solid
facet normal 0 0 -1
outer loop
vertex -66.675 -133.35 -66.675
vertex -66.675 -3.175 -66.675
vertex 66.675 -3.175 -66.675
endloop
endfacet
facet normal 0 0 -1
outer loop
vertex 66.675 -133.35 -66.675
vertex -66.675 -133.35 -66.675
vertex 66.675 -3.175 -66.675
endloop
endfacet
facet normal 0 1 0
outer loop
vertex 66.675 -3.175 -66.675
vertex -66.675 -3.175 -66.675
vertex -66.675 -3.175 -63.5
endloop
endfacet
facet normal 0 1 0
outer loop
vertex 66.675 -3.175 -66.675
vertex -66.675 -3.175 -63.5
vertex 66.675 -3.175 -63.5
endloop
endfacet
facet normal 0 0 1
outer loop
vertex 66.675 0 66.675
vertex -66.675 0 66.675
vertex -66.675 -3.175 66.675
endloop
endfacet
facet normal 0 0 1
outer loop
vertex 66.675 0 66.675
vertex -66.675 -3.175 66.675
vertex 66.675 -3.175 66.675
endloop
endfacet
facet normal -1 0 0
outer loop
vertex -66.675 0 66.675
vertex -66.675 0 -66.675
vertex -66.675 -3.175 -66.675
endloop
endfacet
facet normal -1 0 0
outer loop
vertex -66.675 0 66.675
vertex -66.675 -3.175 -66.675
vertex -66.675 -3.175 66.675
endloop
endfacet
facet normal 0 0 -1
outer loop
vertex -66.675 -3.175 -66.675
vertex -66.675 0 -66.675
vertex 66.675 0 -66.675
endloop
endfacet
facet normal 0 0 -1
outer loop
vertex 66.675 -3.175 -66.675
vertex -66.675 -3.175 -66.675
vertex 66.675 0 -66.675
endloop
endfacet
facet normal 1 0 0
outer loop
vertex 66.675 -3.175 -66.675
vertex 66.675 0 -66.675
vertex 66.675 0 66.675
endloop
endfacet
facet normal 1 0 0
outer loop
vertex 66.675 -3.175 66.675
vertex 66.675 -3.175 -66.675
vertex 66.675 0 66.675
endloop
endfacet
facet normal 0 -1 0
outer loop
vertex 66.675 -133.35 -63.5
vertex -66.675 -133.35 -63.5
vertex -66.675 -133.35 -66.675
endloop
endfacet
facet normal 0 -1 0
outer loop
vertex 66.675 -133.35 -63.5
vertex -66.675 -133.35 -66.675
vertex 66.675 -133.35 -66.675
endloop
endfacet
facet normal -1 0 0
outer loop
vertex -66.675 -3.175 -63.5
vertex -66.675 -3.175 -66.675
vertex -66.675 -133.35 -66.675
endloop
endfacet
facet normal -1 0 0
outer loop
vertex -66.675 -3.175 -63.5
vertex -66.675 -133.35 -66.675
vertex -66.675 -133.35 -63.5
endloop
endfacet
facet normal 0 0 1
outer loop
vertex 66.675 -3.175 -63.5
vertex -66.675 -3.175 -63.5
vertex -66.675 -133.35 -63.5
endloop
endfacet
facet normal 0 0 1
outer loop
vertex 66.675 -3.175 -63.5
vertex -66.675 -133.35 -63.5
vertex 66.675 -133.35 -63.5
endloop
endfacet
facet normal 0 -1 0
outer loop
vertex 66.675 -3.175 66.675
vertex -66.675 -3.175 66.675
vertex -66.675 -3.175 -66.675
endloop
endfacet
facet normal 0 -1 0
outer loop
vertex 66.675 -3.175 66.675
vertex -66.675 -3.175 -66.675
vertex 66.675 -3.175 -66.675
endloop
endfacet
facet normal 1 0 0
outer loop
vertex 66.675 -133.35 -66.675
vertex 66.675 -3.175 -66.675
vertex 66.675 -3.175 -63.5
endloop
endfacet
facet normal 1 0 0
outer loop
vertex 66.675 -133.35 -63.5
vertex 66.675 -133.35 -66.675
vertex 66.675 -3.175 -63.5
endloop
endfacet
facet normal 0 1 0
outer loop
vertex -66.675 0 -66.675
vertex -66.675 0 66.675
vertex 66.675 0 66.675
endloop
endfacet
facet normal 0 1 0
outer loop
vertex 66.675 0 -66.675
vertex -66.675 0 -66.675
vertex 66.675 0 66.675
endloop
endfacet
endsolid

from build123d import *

# Parameters (mm, degrees)
F0_W     = 133.35
F0_H     = 133.35
F1_DEPTH = 3.175
F2_W     = 133.35
F2_H     = 3.175
F3_DEPTH = 133.35
F4_W     = 25.4
F4_H     = 3.175
F5_DEPTH = 3.175


with BuildPart() as f1:
    # F0 (on Front) → F1 (new body)
    with BuildSketch(Plane.XZ):
        Rectangle(F0_W, F0_H)
    extrude(amount=F1_DEPTH)


with BuildPart() as f3:
    # F2 (on face) → F3 (new body)
    with BuildSketch(Plane.XZ):
        with Locations((0, -65.0875)):
            Rectangle(F2_W, F2_H)
    extrude(amount=F3_DEPTH)

    # F4 (on face) → F5 (cut)
    with BuildSketch(Plane(origin=(0, 0, -66.675), x_dir=(1, 0, 0), z_dir=(0, 0, -1))):
        with Locations((-53.975, 1.5875)):
            Rectangle(F4_W, F4_H)
        with Locations((-7.62, 1.5875)):
            Rectangle(F4_W, F4_H)
        with Locations((38.735, 1.5875)):
            Rectangle(F4_W, F4_H)
    extrude(amount=-F5_DEPTH, mode=Mode.SUBTRACT)

    # F6: cut F1
    add(f1.part, mode=Mode.SUBTRACT)


solid = Compound([f1.part, f3.part])
